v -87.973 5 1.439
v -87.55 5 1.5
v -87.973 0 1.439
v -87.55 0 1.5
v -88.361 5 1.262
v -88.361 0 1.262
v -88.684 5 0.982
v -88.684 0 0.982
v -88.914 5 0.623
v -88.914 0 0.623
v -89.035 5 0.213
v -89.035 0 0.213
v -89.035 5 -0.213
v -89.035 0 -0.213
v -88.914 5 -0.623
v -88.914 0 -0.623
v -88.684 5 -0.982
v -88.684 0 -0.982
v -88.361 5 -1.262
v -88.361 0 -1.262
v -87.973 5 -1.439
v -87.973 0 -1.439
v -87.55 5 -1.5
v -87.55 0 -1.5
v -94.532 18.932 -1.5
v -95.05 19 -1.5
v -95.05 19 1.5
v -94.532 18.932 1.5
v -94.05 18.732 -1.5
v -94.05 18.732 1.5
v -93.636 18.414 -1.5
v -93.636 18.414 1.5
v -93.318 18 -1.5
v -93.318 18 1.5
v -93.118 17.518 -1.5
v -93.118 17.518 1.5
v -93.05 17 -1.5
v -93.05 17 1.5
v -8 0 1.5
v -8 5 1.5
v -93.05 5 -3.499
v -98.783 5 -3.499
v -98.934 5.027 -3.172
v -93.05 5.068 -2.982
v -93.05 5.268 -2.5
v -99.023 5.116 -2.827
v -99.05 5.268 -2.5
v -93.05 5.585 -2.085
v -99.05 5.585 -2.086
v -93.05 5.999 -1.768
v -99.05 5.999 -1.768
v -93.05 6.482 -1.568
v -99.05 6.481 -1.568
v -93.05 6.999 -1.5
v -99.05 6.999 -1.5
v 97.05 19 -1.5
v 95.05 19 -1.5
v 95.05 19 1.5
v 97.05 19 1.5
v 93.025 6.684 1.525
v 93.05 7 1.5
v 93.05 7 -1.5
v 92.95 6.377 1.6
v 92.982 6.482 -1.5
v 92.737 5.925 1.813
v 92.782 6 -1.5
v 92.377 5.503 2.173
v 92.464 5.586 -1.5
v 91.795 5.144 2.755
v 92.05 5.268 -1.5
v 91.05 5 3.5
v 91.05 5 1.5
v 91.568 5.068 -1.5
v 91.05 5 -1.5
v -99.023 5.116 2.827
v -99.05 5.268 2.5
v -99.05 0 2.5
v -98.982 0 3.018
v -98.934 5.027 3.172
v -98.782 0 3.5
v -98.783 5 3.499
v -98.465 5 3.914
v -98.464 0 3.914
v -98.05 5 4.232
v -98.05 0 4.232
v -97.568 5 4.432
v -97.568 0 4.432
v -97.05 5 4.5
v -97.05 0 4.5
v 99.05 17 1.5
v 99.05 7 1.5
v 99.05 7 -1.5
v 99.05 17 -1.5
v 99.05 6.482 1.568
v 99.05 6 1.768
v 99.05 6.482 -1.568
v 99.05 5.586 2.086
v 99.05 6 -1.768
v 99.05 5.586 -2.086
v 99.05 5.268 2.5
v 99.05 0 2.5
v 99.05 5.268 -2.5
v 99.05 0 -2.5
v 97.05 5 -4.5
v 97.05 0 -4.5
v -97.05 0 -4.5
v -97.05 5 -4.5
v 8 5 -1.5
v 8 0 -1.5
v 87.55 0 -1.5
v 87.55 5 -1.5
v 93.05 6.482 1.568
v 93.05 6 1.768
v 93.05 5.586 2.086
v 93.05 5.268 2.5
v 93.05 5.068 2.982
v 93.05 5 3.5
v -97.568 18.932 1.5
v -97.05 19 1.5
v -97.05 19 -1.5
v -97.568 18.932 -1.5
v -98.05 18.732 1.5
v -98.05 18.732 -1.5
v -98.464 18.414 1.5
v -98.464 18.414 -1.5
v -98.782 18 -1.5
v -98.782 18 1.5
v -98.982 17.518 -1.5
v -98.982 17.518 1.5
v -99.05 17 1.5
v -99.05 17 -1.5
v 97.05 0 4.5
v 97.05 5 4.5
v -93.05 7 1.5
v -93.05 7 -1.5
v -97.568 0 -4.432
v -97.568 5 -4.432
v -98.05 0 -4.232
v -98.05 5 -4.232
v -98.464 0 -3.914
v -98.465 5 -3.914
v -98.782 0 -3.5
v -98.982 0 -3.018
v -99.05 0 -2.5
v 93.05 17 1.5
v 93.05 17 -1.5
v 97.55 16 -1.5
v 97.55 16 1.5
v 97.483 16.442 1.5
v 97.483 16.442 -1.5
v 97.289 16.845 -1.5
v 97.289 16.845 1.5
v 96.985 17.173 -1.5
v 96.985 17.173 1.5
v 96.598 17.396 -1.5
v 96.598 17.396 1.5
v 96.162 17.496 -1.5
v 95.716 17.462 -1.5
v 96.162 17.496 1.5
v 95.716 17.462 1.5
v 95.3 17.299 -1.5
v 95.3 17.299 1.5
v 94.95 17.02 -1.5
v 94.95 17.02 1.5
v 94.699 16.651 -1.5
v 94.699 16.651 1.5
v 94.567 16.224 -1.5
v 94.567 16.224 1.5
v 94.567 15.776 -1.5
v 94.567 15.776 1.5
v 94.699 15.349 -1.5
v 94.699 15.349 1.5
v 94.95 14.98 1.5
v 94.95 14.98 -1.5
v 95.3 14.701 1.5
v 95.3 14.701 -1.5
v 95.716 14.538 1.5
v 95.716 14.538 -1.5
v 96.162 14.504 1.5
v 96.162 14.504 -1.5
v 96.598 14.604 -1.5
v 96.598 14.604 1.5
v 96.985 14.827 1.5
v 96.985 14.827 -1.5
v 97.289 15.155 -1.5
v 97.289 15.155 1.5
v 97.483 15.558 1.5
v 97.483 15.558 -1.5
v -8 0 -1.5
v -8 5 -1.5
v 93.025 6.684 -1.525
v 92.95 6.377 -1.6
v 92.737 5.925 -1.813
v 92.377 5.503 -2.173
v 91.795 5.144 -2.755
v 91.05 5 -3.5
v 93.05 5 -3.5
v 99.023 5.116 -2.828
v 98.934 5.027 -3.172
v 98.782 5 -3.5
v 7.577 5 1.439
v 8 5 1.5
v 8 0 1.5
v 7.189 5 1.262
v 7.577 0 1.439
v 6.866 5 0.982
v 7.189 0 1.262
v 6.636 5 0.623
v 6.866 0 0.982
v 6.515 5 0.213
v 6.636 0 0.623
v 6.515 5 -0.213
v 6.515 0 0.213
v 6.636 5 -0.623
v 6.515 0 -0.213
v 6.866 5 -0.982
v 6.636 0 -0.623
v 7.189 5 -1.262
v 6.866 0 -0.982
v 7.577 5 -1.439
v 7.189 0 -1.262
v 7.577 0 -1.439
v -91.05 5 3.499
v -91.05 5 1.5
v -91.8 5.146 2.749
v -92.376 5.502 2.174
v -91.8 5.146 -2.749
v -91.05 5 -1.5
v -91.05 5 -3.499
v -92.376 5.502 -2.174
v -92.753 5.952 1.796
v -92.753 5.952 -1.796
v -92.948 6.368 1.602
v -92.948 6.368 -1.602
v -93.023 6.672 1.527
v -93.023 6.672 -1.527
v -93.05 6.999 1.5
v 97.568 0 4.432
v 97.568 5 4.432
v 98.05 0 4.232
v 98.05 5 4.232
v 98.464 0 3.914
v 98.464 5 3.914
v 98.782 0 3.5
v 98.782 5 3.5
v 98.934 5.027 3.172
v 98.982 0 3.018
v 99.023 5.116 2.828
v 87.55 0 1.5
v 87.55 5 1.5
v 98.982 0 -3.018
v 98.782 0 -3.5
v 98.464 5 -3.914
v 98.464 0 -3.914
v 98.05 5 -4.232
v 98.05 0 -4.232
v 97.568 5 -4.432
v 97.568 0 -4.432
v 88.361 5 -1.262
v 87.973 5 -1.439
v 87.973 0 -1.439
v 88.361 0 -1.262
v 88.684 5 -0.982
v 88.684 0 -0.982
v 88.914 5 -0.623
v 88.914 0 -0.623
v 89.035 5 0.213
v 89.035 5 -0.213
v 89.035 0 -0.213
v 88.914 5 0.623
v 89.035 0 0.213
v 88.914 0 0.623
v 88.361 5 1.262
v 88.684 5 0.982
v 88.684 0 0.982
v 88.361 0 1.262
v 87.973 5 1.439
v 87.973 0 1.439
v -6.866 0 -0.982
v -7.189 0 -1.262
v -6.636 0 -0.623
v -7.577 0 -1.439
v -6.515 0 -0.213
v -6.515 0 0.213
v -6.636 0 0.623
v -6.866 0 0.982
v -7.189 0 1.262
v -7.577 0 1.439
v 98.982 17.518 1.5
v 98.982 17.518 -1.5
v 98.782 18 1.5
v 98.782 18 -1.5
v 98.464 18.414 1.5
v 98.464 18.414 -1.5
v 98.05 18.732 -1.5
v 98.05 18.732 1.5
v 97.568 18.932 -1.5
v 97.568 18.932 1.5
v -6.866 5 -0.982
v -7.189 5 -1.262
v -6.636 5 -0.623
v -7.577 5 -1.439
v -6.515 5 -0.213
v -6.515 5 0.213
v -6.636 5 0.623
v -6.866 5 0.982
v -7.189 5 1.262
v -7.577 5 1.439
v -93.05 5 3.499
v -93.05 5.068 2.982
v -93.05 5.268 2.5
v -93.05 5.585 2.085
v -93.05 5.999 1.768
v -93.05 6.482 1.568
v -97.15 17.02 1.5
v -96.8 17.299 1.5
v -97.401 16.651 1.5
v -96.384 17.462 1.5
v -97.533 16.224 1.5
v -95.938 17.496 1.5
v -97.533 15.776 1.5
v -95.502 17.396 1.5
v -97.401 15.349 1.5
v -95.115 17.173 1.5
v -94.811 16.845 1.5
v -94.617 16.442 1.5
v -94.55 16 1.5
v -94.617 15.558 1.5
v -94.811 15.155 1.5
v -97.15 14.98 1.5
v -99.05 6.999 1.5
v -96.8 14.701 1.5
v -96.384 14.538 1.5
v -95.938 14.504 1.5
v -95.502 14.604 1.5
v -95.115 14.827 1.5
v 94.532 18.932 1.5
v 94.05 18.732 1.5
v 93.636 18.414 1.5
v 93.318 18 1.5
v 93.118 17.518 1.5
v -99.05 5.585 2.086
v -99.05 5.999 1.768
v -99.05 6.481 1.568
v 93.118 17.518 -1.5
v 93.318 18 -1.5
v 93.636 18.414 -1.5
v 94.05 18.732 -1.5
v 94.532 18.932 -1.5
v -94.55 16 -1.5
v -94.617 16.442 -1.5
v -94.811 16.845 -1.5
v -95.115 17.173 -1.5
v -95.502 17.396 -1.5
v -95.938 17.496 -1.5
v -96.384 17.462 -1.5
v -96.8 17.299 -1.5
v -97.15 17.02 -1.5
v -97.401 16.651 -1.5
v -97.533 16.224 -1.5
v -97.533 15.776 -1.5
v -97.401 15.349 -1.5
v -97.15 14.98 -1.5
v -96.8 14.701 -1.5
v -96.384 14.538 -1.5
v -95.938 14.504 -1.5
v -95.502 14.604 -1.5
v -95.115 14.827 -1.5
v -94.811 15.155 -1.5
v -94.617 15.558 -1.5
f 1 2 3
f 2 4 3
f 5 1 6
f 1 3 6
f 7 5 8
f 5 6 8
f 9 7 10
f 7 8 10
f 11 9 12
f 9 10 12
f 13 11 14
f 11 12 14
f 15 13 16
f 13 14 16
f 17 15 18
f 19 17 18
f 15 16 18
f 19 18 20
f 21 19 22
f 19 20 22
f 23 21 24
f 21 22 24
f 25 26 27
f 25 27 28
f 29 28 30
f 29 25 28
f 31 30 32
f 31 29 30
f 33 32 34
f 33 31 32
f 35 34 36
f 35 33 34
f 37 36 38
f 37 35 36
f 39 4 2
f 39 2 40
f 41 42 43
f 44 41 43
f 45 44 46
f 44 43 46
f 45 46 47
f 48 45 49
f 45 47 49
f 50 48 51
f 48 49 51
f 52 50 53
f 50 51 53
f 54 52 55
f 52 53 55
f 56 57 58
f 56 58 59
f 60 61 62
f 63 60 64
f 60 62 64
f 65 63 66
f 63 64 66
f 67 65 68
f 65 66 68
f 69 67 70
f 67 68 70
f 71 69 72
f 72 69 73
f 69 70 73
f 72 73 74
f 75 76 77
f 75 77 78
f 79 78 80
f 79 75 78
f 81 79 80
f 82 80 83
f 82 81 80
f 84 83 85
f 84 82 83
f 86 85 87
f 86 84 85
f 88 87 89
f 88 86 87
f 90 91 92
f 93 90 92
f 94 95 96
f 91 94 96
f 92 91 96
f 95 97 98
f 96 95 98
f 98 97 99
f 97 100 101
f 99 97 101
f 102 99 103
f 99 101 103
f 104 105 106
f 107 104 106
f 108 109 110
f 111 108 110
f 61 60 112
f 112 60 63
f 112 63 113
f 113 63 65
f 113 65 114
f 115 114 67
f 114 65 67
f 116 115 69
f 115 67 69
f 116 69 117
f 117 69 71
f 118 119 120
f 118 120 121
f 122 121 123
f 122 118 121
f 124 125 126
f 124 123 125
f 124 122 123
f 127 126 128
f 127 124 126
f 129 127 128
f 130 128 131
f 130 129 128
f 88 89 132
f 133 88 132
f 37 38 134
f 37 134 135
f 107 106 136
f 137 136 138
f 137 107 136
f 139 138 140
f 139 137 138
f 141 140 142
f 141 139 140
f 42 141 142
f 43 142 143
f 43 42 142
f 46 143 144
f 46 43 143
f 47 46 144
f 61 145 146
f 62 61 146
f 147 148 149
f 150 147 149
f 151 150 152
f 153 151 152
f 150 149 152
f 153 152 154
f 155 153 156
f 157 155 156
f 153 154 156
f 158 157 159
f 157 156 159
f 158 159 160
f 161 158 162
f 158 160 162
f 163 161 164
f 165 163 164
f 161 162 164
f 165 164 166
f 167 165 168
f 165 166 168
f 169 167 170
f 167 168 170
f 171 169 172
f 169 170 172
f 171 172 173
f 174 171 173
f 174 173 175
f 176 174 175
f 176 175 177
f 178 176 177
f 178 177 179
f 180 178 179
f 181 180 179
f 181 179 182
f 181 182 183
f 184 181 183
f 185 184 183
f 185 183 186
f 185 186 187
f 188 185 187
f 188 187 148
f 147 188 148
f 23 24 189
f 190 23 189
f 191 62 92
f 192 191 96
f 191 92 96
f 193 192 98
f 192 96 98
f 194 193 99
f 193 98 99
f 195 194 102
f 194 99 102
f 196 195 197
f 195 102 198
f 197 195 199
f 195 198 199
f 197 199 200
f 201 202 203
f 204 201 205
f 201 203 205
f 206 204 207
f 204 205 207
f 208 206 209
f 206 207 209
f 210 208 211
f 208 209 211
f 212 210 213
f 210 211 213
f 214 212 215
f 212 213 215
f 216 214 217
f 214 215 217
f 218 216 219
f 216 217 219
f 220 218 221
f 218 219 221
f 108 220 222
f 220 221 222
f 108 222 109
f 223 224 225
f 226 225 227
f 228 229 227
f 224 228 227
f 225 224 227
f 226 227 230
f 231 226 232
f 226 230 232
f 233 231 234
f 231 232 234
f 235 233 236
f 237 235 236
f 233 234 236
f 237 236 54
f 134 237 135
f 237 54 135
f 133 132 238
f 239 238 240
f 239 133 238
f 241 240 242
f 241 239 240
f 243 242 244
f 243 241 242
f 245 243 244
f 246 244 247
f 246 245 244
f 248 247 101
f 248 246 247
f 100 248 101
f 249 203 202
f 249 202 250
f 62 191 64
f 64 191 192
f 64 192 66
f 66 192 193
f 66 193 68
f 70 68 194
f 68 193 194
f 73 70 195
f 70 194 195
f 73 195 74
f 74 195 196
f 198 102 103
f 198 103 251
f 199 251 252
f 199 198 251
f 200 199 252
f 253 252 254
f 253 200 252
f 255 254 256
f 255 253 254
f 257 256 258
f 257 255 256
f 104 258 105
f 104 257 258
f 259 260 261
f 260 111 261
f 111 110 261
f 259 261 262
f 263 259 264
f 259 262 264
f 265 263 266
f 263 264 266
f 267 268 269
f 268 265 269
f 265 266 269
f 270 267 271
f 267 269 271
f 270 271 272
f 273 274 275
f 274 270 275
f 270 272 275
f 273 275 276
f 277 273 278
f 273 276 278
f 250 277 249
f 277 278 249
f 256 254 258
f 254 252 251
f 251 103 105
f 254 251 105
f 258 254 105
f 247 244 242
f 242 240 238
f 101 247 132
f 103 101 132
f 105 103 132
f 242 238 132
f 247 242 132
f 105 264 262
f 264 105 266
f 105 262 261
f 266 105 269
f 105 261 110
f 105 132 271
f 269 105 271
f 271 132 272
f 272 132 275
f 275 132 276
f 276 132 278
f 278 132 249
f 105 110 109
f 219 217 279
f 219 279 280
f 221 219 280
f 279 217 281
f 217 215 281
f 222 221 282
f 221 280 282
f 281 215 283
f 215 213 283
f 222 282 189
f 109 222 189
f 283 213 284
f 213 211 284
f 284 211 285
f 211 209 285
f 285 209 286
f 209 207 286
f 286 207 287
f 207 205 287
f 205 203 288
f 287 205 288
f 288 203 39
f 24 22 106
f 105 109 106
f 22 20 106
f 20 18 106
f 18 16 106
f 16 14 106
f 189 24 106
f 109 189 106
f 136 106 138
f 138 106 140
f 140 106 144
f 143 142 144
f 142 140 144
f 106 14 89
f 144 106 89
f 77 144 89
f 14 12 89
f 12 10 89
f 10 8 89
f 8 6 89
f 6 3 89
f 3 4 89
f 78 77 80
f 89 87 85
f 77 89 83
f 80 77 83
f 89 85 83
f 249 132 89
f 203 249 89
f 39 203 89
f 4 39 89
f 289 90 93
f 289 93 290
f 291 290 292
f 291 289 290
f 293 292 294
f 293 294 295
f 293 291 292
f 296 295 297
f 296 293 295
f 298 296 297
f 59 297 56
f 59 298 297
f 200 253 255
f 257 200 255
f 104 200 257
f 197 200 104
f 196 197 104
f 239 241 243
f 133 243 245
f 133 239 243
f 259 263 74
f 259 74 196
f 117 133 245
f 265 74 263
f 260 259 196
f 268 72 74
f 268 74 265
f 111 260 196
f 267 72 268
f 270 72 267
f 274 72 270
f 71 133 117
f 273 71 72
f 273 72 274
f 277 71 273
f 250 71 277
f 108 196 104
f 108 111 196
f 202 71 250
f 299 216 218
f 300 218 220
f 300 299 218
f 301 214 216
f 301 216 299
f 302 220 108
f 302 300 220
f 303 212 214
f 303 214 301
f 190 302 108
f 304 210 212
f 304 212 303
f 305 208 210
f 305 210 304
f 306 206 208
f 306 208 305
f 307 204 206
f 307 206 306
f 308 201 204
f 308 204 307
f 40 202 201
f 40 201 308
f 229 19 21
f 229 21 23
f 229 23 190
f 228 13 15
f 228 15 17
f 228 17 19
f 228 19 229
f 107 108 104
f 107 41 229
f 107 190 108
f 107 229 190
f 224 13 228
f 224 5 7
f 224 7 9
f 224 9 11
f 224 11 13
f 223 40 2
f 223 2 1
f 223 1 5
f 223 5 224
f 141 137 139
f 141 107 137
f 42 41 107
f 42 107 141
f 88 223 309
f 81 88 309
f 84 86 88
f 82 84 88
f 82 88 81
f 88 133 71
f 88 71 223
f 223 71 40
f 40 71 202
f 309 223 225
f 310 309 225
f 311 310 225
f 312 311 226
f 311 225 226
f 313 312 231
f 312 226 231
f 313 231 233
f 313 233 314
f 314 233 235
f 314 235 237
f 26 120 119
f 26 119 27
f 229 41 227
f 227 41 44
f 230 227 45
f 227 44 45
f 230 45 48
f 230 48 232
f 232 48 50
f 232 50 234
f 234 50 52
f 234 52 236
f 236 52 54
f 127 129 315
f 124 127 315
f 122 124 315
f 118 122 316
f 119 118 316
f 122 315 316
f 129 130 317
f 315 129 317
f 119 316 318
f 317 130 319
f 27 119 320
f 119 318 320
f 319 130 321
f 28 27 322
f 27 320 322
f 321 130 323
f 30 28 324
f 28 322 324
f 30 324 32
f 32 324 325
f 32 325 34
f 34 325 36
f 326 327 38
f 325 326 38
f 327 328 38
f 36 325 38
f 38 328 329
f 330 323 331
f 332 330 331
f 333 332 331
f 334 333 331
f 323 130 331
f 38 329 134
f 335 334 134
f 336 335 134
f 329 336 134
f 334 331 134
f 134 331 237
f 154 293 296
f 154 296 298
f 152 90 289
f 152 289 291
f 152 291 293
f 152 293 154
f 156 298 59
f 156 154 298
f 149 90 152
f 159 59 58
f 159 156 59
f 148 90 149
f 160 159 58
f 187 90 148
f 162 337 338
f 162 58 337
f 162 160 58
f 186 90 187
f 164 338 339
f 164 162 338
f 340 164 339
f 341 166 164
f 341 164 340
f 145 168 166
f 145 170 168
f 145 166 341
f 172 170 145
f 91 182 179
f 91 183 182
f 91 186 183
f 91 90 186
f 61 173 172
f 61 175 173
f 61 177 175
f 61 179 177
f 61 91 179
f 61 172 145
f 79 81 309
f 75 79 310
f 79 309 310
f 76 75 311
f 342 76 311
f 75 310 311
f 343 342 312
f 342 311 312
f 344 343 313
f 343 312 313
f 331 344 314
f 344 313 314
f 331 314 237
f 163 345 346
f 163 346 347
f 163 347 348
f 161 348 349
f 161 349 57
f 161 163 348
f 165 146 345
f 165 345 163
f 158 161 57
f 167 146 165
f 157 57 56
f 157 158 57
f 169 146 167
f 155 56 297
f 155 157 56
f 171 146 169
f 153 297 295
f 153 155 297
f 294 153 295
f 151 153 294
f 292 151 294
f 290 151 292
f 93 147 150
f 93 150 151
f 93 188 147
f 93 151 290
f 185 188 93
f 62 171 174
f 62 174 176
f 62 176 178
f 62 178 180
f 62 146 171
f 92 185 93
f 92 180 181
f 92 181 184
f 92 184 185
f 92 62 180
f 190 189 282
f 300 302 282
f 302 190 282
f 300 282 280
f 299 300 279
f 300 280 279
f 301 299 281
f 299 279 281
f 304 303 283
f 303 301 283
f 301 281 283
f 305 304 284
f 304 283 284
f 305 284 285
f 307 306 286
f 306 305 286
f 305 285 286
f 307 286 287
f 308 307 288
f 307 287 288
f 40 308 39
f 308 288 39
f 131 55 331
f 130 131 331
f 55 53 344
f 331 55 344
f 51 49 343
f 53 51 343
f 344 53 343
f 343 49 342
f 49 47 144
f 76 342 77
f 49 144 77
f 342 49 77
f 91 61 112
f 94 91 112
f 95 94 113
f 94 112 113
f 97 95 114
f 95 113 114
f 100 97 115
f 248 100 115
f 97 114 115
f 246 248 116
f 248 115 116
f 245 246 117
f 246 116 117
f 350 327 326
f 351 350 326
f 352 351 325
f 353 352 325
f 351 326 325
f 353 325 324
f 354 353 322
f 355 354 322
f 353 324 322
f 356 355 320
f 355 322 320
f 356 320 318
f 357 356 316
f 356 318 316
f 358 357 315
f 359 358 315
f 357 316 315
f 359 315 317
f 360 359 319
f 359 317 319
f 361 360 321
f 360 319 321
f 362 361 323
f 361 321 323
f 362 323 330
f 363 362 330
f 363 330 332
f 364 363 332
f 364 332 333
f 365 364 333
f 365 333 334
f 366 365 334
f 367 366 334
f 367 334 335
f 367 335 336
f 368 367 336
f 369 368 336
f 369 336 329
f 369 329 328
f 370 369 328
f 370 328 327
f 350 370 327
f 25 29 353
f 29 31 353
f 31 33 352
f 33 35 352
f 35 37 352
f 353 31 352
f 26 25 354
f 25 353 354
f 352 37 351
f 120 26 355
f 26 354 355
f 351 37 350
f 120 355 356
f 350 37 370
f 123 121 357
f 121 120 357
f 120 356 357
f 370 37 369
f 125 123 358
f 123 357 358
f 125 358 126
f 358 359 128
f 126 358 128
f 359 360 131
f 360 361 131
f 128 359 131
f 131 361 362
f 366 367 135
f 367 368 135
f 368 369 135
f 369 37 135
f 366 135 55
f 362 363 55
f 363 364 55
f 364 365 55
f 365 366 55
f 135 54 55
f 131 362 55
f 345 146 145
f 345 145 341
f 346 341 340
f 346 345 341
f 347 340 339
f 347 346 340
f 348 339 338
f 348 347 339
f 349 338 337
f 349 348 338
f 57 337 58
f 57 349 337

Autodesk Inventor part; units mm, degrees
ref_plane "YZ Plane" through (0, 0, 0) normal (1, 0, 0) x (0, 1, 0)
ref_plane "XZ Plane" through (0, 0, 0) normal (0, 1, 0) x (-1, 0, 0)
ref_plane "XY Plane" through (0, 0, 0) normal (0, 0, 1) x (1, 0, 0)
sketch "Sketch1" plane through (0, 0, 0) normal (0, 1, 0) x (-1, 0, 0)
  line L0 (99.05, 4.5) -> (-99.05, 4.5)
  line L1 (-99.05, 4.5) -> (-99.05, -4.5)
  line L2 (-99.05, -4.5) -> (99.05, -4.5)
  line L3 (99.05, -4.5) -> (99.05, 4.5)
  line L4 (99.05, 4.5) -> (-99.05, -4.5) construction
  line L5 (-99.05, 4.5) -> (99.05, -4.5) construction
  line L6 (99.05, 0) -> (87.55, 0) construction
  line L7 (-99.05, 0) -> (-87.55, 0) construction
  circle A0 centre (-87.55, 0) radius 1.5
  circle A1 centre (87.55, 0) radius 1.5
  line L8 (87.55, -1.5) -> (-87.55, -1.5)
  line L9 (99.05, 4.5) -> (99.05, 12.375)
  line L10 (99.05, 4.5) -> (106.925, 4.5) construction
  line L11 (99.05, 12.375) -> (94.05, 12.375)
  line L12 (94.05, 12.375) -> (94.05, 20.375)
  line L13 (94.05, 20.375) -> (99.05, 20.375)
  line L14 (99.05, 20.375) -> (99.05, 12.375)
  line L15 (94.05, 12.375) -> (94.05, 4.5)
  line L16 (94.05, 12.375) -> (101.925, 12.375) construction
  line L17 (-99.05, 4.5) -> (-99.05, 12.375)
  line L18 (-99.05, 4.5) -> (-91.175, 4.5) construction
  line L19 (-99.05, 12.375) -> (-94.05, 12.375)
  line L20 (-94.05, 12.375) -> (-94.05, 20.375)
  line L21 (-94.05, 20.375) -> (-99.05, 20.375)
  line L22 (-99.05, 20.375) -> (-99.05, 12.375)
  line L23 (-94.05, 12.375) -> (-94.05, 4.5)
  line L24 (-94.05, 12.375) -> (-86.175, 12.375) construction
  circle A2 centre (0, 0) radius 1.5
  line L25 (0, -1.5) -> (-8, -1.5) construction
  line L26 (0, -1.5) -> (8, -1.5) construction
  circle A3 centre (8, 0) radius 1.5
  circle A4 centre (-8, 0) radius 1.5
  line L27 (96.55, 20.375) -> (96.55, 17.375) construction
  line L28 (-96.55, 20.375) -> (-96.55, 17.375) construction
  circle A5 centre (-96.55, 17.375) radius 1.5
  circle A6 centre (96.55, 17.375) radius 1.5
  line L29 (87.55, 1.5) -> (-87.55, 1.5)
  point P0 (-94.05, 4.5)
  point P1 (8, -1.5)
  point P2 (-8, -1.5)
  point P3 (8.3564, -1.4534)
  point P4 (-7.6436, -1.4608)
  point P5 (-8, 1.5)
  point P6 (8, 1.5)
  dimension "d27" = 3
  dimension "d0" = 198.1
  dimension "d1" = 9
  dimension "d2" = 11.5
  dimension "d3" = 11.5
  dimension "d4" = 3
  dimension "d5" = 3
  dimension "d8" = 7.875
  dimension "d9" = 90
  dimension "d10" = 5
  dimension "d11" = 8
  dimension "d12" = 90
  dimension "d13" = 7.875
  dimension "d14" = 90
  dimension "d15" = 5
  dimension "d16" = 8
  dimension "d17" = 90
  dimension "d28" = 8
  dimension "d29" = 8
  dimension "d30" = 3
  dimension "d31" = 3
  dimension "d32" = 1.5
  dimension "d33" = 8
  dimension "d34" = 8
  dimension "d35" = 1.5
  dimension "d36" = 3
  dimension "d37" = 3
  dimension "d38" = 3
  dimension "d39" = 3
extrude "Extrusion1" add sketch "Sketch1" along normal blind 5 contours L3 L2 L1 L0 | L29 A2 L8 A4 | L29 A3 L8 A2 | A2
sketch "Sketch4" plane through (0, 5, 0) normal (0, 1, 0) x (1, 0, 0)
  line L0 (99.05, -4.5) -> (99.05, 4.5) construction
  line L1 (99.05, 0) -> (109.05, 0) construction
  line L2 (99.05, 0) -> (96.05, 0) construction
  line L3 (99.05, -1.5) -> (93.05, -1.5)
  line L4 (93.05, -1.5) -> (93.05, 1.5)
  line L5 (93.05, 1.5) -> (99.05, 1.5)
  line L6 (99.05, 1.5) -> (99.05, -1.5)
  line L7 (99.05, -1.5) -> (93.05, 1.5) construction
  line L8 (93.05, -1.5) -> (99.05, 1.5) construction
  line L9 (-99.05, 4.5) -> (-99.05, -4.5) construction
  line L10 (-99.05, 0) -> (-93.05, 0) construction
  line L11 (-99.05, -1.5) -> (-93.05, -1.5)
  line L12 (-93.05, -1.5) -> (-93.05, 1.5)
  line L13 (-93.05, 1.5) -> (-99.05, 1.5)
  line L14 (-99.05, 1.5) -> (-99.05, -1.5)
  line L15 (-99.05, -1.5) -> (-93.05, 1.5) construction
  line L16 (-93.05, -1.5) -> (-99.05, 1.5) construction
  point P0 (0, 0)
  point P1 (-96.05, 0)
  dimension "d54" = 3
  dimension "d55" = 6
  dimension "d56" = 3
  dimension "d57" = 6
  dimension "d58" = 6
  dimension "d59" = 3
extrude "Extrusion4" add sketch "Sketch4" along normal blind 14
sketch "Sketch5" plane through (-99.05, 5, 1.5) normal (0, 0, 1) x (1, 0, 0)
  line L0 (6, 14) -> (0, 14) construction
  line L1 (3, 14) -> (3, 11) construction
  circle A0 centre (3, 11) radius 1.5
  line L2 (198.1, 14) -> (192.1, 14) construction
  line L3 (195.1, 14) -> (195.1, 11) construction
  line L4 (195.1, 14) -> (198.1, 14) construction
  circle A1 centre (195.1, 11) radius 1.5
  point P0 (99.05, -5)
  dimension "d62" = 3
  dimension "d63" = 3
  dimension "d64" = 3
  dimension "d65" = 90
  dimension "d66" = 3
extrude "Extrusion5" cut sketch "Sketch5" against normal through all
fillet "Fillet4" radius 2 4 edges at (99.05, 19, 0) (93.05, 19, 0) (-93.05, 19, 0) (-99.05, 19, 0)
fillet "Fillet5" radius 2 10 edges at (-96.05, 5, 1.5) (-96.05, 5, -1.5) (-93.05, 5, 0) (96.05, 5, 1.5) (93.05, 5, 0) (96.05, 5, -1.5) (99.05, 2.5, 4.5) (99.05, 2.5, -4.5) (-99.05, 2.5, 4.5) (-99.05, 2.5, -4.5)
properties part number "Brace_slide_v3"
